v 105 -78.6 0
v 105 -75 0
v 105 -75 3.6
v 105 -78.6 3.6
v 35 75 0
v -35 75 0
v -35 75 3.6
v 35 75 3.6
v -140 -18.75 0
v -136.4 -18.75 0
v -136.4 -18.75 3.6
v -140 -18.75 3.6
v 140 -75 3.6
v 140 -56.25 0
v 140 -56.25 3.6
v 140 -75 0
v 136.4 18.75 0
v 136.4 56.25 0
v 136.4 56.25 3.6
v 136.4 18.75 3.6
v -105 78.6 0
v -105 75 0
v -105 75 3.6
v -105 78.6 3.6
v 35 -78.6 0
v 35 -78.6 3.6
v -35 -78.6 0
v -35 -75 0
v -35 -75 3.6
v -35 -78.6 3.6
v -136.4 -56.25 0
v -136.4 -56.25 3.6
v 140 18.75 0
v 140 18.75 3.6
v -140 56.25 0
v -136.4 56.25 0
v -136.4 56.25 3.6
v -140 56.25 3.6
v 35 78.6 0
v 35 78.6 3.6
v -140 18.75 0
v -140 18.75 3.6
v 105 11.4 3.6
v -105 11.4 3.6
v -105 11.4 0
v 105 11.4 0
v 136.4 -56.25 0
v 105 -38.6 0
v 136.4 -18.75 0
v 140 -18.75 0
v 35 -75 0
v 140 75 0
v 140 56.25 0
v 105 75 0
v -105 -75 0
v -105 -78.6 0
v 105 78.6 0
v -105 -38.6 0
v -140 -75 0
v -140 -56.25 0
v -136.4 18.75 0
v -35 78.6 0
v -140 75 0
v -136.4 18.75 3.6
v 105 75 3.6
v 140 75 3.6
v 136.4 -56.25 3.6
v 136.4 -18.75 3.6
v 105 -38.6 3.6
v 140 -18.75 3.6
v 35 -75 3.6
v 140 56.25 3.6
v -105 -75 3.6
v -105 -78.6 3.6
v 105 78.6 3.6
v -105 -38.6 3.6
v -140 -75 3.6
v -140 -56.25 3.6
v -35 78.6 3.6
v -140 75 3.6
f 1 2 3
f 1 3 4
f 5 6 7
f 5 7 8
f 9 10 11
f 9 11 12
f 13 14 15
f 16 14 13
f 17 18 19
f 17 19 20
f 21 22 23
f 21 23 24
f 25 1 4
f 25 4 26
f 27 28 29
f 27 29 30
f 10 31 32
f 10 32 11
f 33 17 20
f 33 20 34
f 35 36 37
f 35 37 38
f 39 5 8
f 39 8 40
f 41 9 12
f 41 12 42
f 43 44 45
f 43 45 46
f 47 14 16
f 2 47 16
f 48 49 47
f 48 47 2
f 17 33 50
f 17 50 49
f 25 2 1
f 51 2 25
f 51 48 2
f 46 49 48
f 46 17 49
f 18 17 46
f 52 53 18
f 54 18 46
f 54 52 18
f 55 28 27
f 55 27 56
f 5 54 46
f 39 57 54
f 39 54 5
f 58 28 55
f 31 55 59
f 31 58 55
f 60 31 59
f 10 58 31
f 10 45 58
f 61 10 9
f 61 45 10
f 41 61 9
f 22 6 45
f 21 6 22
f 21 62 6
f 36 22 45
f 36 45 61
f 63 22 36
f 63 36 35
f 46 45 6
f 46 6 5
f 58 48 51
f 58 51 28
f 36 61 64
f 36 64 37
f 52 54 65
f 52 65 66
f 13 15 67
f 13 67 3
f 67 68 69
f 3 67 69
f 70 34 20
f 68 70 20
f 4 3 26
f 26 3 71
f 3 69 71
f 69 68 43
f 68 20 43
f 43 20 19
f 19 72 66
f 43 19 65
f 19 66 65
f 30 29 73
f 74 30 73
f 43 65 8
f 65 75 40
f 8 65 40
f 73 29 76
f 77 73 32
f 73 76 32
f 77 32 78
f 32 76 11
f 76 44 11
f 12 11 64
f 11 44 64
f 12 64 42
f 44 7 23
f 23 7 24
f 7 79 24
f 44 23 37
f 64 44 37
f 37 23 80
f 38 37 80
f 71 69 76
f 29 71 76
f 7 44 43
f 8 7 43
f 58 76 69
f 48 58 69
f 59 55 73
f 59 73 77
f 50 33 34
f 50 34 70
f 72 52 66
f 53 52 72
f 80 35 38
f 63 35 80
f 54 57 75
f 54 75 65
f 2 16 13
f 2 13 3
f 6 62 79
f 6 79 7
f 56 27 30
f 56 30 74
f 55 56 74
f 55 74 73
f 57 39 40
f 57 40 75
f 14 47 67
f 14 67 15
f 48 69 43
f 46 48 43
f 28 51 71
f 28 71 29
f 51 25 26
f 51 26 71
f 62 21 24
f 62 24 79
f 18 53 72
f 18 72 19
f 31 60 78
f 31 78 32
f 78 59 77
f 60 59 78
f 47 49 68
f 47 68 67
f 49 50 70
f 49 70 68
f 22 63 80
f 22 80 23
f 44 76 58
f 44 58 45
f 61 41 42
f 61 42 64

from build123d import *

# Parameters (mm, degrees)
EXTRUDE_1_DEPTH     = 3.6
SKETCH_2_W          = 210
SKETCH_2_H          = 50
CUT_EXTRUDE_1_DEPTH = 10


with BuildPart() as part:
    # 草图1 → 凸台-拉伸1 (new body)
    with BuildSketch(Plane.XY):
        Polygon((140, -75), (105, -75), (105, -78.6), (35, -78.6), (35, -75), (-35, -75), (-35, -78.6), (-105, -78.6), (-105, -75), (-140, -75), (-140, -56.25), (-136.4, -56.25), (-136.4, -18.75), (-140, -18.75), (-140, 18.75), (-136.4, 18.75), (-136.4, 56.25), (-140, 56.25), (-140, 75), (-105, 75), (-105, 78.6), (-35, 78.6), (-35, 75), (35, 75), (35, 78.6), (105, 78.6), (105, 75), (140, 75), (140, 56.25), (136.4, 56.25), (136.4, 18.75), (140, 18.75), (140, -18.75), (136.4, -18.75), (136.4, -56.25), (140, -56.25), align=None)
    extrude(amount=EXTRUDE_1_DEPTH)

    # 草图2 → 切除-拉伸1 (cut)
    with BuildSketch(Plane.XY.offset(3.6)):
        with Locations((0, -13.6)):
            Rectangle(SKETCH_2_W, SKETCH_2_H)
    extrude(amount=-CUT_EXTRUDE_1_DEPTH, mode=Mode.SUBTRACT)


solid = part.part
